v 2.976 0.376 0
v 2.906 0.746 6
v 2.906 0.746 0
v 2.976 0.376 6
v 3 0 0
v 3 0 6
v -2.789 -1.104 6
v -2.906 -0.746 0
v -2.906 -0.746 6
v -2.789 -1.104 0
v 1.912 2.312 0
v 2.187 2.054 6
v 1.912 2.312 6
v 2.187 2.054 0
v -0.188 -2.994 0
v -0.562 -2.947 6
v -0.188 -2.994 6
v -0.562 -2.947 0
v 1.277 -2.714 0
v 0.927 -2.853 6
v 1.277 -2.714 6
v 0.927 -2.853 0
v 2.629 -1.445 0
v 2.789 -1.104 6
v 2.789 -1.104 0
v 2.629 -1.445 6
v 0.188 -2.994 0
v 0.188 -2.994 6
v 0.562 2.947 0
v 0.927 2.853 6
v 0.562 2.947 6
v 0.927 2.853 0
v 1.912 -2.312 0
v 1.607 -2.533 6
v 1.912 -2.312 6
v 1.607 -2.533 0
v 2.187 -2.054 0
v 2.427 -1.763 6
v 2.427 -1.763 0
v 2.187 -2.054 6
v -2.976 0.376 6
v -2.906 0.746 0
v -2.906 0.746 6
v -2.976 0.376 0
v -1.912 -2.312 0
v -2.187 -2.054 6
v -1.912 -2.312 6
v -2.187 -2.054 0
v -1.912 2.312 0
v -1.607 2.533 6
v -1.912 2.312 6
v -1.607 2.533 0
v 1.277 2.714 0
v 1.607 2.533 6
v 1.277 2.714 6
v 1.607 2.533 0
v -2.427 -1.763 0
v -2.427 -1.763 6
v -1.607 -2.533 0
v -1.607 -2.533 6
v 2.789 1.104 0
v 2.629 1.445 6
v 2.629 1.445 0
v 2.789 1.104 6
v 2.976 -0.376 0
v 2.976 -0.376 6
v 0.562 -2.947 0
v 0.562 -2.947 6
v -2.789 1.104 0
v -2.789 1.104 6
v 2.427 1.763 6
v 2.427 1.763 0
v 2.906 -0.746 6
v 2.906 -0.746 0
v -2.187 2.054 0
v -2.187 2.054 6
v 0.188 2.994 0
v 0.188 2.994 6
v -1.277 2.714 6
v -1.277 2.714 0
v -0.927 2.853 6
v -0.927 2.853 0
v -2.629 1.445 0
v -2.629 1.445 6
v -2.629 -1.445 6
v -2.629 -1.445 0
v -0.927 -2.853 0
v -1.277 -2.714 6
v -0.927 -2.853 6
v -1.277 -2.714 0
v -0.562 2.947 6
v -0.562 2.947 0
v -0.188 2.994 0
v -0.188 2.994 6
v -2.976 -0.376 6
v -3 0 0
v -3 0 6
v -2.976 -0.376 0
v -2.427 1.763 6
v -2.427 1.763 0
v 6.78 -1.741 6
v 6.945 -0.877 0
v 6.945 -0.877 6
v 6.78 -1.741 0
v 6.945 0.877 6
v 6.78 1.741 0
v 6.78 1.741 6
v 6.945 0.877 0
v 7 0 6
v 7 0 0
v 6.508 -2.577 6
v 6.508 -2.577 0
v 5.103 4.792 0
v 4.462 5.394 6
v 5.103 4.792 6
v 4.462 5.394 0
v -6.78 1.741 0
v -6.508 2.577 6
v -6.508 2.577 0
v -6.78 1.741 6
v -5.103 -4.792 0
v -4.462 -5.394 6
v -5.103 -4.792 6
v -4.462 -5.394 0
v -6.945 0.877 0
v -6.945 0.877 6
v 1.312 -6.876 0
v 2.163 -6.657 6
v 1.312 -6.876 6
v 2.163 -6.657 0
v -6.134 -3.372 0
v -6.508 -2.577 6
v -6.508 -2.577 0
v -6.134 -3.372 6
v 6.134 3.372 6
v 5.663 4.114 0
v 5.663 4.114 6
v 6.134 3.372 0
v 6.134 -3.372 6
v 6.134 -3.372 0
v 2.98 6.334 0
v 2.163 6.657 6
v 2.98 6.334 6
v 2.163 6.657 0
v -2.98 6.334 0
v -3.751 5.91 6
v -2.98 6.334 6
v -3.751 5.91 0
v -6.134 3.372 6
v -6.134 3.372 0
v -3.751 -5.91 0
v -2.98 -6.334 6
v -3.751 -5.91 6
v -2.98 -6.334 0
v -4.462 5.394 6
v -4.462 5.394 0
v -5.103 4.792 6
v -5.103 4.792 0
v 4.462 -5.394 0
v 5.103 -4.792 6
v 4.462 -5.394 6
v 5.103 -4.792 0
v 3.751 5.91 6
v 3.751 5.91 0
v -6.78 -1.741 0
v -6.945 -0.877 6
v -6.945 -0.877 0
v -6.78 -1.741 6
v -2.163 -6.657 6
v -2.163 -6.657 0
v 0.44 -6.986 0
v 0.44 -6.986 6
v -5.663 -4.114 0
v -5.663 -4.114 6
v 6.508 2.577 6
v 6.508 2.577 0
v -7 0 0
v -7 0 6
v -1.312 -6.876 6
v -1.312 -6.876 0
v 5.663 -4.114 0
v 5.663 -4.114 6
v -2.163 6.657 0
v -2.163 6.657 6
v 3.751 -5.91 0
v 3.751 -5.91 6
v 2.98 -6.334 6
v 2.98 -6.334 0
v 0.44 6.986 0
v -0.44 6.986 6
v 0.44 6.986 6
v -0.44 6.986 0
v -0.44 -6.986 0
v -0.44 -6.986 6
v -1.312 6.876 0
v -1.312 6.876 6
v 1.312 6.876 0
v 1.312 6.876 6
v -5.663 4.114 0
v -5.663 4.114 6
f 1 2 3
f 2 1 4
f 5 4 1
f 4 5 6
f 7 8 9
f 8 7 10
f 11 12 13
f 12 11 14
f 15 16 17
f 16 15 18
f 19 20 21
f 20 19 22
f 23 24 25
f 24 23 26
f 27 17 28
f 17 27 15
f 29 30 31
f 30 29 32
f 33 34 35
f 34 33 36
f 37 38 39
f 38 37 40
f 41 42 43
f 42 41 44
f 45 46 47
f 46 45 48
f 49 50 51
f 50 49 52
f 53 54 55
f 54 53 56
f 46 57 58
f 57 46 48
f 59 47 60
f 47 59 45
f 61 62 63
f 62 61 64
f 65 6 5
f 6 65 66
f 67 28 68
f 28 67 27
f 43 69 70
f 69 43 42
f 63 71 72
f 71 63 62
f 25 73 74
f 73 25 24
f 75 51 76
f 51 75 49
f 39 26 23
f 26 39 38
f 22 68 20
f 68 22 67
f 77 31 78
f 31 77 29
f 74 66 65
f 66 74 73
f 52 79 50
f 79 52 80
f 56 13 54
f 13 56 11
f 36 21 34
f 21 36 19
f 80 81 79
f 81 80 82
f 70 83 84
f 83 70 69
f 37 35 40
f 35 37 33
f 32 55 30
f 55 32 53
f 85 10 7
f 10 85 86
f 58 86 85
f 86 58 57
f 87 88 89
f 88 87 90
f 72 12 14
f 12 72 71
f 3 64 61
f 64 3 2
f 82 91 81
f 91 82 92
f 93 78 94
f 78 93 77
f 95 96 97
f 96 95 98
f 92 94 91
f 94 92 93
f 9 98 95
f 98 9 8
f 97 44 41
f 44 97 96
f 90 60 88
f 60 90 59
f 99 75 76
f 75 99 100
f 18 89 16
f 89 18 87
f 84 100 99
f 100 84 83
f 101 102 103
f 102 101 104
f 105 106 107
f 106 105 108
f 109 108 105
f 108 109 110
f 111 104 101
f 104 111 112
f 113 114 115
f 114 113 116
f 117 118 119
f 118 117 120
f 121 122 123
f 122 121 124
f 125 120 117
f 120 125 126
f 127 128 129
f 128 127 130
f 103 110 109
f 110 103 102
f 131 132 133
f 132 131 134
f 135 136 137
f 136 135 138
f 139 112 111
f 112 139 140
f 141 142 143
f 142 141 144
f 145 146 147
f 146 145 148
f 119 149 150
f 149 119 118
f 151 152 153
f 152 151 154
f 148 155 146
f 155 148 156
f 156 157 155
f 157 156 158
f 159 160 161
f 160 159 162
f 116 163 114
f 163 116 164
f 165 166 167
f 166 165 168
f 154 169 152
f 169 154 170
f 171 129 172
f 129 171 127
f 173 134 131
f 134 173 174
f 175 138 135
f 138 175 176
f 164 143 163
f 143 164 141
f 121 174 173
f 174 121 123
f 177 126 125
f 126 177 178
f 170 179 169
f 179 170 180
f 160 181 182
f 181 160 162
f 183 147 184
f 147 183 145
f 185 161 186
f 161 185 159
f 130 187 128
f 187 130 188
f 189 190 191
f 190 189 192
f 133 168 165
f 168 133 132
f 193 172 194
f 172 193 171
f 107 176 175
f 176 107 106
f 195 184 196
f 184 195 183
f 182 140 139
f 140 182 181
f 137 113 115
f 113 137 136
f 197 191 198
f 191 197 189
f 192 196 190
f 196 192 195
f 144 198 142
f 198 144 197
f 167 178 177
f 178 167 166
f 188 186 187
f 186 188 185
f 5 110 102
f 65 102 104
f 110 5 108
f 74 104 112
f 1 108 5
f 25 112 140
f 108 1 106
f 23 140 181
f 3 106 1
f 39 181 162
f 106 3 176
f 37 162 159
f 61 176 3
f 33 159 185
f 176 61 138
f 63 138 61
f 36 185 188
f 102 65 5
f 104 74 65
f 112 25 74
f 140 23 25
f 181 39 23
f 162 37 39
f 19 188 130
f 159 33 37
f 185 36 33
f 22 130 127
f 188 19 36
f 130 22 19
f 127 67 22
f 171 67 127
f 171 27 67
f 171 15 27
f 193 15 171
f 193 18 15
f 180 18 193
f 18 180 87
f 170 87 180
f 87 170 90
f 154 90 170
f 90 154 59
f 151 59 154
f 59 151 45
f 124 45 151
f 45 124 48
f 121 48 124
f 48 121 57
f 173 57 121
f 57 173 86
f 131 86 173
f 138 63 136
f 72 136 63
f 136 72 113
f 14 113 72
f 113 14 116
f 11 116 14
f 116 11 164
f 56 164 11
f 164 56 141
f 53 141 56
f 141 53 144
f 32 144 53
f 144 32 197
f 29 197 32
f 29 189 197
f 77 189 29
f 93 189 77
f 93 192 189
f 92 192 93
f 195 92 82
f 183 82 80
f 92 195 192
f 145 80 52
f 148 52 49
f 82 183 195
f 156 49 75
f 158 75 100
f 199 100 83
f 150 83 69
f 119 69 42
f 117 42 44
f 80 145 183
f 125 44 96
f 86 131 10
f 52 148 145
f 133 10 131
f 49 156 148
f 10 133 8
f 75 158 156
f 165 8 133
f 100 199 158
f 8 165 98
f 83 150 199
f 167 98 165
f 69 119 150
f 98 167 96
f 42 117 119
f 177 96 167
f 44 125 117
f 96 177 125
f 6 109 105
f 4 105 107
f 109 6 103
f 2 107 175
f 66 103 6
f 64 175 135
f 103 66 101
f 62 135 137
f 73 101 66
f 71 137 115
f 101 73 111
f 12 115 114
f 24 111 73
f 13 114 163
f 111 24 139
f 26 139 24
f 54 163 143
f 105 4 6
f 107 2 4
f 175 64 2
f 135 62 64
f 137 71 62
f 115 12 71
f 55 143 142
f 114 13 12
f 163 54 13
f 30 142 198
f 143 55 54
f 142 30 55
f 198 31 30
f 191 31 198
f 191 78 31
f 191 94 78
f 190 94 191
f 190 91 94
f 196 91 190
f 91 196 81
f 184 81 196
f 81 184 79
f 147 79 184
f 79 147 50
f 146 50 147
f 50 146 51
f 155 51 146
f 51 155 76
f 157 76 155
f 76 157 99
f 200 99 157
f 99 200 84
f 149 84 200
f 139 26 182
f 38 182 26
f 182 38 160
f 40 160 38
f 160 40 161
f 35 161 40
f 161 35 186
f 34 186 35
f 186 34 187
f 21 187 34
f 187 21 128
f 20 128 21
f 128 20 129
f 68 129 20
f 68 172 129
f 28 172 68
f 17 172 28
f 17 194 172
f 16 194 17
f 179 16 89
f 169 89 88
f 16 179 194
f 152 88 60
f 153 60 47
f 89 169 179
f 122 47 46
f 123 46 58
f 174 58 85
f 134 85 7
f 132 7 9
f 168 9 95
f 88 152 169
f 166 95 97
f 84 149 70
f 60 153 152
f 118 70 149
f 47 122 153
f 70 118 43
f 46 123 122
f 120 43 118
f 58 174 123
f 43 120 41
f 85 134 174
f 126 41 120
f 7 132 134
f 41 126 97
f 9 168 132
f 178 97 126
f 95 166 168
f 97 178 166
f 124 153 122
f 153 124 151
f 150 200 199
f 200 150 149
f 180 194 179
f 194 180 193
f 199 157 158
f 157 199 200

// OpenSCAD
$fn = 50;

difference() {
	union() {
		cylinder(h = 6, r = 7.0);
	}
	union() {
		translate(v = [0, 0, -100]) {
			cylinder(h = 200, r = 3.0);
		}
		translate(v = [0, 0, -100]) {
			cylinder(h = 200, r = 1.5);
		}
	}
}
